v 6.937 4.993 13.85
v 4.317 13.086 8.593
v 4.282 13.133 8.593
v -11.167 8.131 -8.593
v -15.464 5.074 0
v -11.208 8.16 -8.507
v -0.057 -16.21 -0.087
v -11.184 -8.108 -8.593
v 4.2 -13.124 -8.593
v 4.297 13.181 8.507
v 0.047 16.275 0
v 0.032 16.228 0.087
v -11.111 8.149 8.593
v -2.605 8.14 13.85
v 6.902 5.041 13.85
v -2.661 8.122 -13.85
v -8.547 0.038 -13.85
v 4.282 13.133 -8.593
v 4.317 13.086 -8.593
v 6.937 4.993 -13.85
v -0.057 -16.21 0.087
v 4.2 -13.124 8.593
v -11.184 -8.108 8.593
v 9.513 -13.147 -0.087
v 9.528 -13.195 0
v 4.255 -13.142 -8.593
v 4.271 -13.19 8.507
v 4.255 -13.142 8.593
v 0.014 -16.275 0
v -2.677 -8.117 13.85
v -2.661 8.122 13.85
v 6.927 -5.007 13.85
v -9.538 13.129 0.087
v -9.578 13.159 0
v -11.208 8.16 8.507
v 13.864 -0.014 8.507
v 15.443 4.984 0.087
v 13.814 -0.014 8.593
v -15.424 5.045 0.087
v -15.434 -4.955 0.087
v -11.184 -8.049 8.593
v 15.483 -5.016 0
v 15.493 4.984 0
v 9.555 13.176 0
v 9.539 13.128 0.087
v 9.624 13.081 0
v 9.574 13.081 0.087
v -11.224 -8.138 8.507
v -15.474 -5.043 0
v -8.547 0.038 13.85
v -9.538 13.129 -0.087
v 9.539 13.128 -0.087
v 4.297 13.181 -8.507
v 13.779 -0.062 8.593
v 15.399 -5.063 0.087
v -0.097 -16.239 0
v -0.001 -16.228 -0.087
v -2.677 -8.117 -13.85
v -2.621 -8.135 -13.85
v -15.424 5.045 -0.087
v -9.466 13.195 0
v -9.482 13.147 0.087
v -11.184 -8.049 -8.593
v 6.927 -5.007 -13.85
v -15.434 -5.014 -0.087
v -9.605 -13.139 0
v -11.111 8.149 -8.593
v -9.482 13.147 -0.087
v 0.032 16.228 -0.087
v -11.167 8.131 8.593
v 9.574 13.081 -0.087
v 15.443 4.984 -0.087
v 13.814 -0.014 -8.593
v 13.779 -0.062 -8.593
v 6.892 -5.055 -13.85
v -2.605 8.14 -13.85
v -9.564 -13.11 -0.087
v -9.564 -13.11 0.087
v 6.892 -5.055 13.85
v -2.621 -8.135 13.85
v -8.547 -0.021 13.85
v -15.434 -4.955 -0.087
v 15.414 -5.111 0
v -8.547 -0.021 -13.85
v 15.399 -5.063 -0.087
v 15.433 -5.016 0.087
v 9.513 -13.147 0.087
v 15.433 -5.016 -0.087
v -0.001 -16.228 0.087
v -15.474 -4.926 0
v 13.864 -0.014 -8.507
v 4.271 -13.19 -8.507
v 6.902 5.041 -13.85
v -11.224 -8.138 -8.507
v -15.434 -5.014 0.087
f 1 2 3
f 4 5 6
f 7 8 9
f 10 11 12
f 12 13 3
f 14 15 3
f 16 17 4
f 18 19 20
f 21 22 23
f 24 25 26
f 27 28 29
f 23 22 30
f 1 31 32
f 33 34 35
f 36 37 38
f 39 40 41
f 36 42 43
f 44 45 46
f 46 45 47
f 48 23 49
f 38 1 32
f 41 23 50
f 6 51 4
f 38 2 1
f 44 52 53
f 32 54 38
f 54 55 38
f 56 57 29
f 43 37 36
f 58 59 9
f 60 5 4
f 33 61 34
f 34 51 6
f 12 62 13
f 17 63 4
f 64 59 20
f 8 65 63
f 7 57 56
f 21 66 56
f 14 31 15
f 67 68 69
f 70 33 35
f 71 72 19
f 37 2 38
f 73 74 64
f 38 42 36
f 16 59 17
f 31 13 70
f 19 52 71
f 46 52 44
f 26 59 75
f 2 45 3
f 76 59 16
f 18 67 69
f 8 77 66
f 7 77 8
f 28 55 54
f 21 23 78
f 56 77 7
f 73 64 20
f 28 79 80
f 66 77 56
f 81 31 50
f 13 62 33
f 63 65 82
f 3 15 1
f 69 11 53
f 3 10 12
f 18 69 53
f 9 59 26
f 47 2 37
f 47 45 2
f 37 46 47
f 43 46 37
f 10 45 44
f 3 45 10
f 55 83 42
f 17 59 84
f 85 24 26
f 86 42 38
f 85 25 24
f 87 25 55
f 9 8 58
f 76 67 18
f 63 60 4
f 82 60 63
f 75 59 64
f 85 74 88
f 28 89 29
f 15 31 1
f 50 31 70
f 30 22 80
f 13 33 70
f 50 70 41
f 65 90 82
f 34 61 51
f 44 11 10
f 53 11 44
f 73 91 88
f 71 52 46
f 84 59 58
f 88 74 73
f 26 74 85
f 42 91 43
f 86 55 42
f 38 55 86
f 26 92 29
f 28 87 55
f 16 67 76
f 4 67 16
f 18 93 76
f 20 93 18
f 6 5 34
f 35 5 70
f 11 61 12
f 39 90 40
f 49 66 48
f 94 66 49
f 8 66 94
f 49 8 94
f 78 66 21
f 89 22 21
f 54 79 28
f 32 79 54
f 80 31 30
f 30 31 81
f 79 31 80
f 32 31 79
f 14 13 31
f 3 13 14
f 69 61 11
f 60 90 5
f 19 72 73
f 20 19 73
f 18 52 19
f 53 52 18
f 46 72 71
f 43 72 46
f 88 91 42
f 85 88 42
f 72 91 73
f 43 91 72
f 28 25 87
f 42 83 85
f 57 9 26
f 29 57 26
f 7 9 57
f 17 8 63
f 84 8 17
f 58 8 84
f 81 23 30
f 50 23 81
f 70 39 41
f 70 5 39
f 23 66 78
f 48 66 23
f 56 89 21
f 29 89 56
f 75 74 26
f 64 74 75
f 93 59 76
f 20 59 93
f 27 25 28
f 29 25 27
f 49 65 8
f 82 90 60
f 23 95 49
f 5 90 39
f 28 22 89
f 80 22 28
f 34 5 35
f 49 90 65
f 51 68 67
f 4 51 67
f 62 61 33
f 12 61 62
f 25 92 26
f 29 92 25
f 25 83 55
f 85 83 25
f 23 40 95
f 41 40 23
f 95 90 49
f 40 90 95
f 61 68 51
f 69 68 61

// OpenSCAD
// Auto-generated OpenSCAD file

    inner_points = 10*[[-0.0016418331039271756, -1.6180331557585443, -9.663416068995967e-15], [0.0016418331039271756, 1.6180331557585443, 9.663416068995967e-15], [-0.9523842975581269, -1.3080512751855748, 1.785566891566374e-13], [0.949727755792118, -1.3099813657560027, -1.9419242480370474e-13], [-0.949727755792118, 1.3099813657560027, 1.9419242480370474e-13], [0.9523842975581269, 1.3080512751855748, -1.785566891566374e-13], [-1.5393483306968156, -0.49843826651935746, 2.9857420804308504e-13], [1.5383336220347341, -0.5015612186636755, -3.045465276211565e-13], [-1.5383336220347341, 0.5015612186636755, 3.045465276211565e-13], [1.5393483306968156, 0.49843826651935746, -2.9857420804308504e-13], [-0.2636863372841518, -0.8087498459225672, -1.376381920471127], [-0.26368633728361235, -0.808749845922584, 1.3763819204712202], [-0.2620445041802246, 0.8092833098359772, -1.3763819204711172], [-0.26204450417968517, 0.8092833098359603, 1.37638192047123], [0.6876832516118934, -0.5006980559200255, -1.3763819204713112], [0.6876832516124327, -0.5006980559200425, 1.376381920471036], [0.6886979602739751, 0.49930142926300763, -1.3763819204713055], [0.6886979602745145, 0.49930142926299065, 1.3763819204710417], [-0.8506503704228404, 0.0008631627436501369, -1.3763819204710068], [-0.8506503704223011, 0.0008631627436331492, 1.3763819204713403], [0.4239969143281142, -1.3094479018426044, -0.850650808352131], [0.4239969143284476, -1.3094479018426148, 0.8506508083519487], [0.42665345609412314, 1.308584739098973, -0.8506508083521155], [0.42665345609445654, 1.3085847390989627, 0.8506508083519643], [-1.1143367077066197, -0.8078866831789286, -0.8506508083518266], [-1.1143367077062865, -0.8078866831789392, 0.8506508083522532], [-1.1126948746026926, 0.8101464725796157, -0.8506508083518168], [-1.1126948746023593, 0.8101464725796051, 0.8506508083522629], [1.376381211886241, -0.0013966266570295412, -0.8506508083523096], [1.3763812118865746, -0.0013966266570400404, 0.8506508083517702]];

    outer_points = 10*[[1.6180220198478508, 0.0, -0.006223506839090811], [-1.6180220198478508, 0.0, 0.006223506839090811], [1.3053494309833273, -0.010073202420207877, -0.9560310572227243], [1.3126651916762522, 0.010073202420207877, 0.9459612116278578], [-1.3126651916762522, -0.010073202420207877, -0.9459612116278578], [-1.3053494309833273, 0.010073202420207877, 0.9560310572227243], [0.4940777266785081, -0.016298783891454047, -1.5406672380477728], [0.5059148761332206, 0.016298783891454047, 1.5368208992919972], [-0.5059148761332206, -0.016298783891454047, -1.5368208992919972], [-0.4940777266785081, 0.016298783891454047, 1.5406672380477728], [0.8079439244447668, 1.3735205511194541, -0.28053858799672193], [0.8080560688782716, -1.3790888804671222, -0.2513826526847642], [-0.810078095403084, 1.3735205511194541, -0.27431508115763115], [-0.8099659509695791, -1.3790888804671222, -0.2451591458456734], [0.5025870962731682, 1.383593753539662, 0.6716461304702268], [0.5026992407066729, -1.3690156780469143, 0.7008020657821845], [-0.4974055065385606, 1.383593753539662, 0.6754924692260023], [-0.4972933621050558, -1.3690156780469143, 0.70464840453796], [-0.003327779860052472, 1.3672949696482082, -0.8651747688217704], [-0.0032156354265477157, -1.3853144619383682, -0.8360188335098125], [1.3106085106156622, 0.8551079663095562, 0.41125379828717096], [1.3106778196872173, -0.8460982201644762, 0.42927315728375415], [-1.3074061120439173, 0.8551079663095562, 0.4213236438820373], [-1.3073368029723622, -0.8460982201644762, 0.4393430028786205], [0.8046936344824416, 0.8388091824181022, -1.1255671010048263], [0.8047629435539967, -0.8623970040559302, -1.1075477420082434], [-0.8133283853654092, 0.8388091824181022, -1.1193435941657353], [-0.8132590762938541, -0.8623970040559302, -1.1013242351691523], [0.005259079632334848, 0.8651811687297641, 1.3672848555098953], [0.00532838870388989, -0.8360250177442683, 1.3853042145064782]];

    // Convex hull for inner set (I)
    module inner_hull() {
        hull() {
            for (p = inner_points) {
                translate(p) sphere(r=0.1);
            }
        }
    }

    // Convex hull for outer set (O) minus inner hull (O \ I)
    module outer_minus_inner() {
        difference() {
            hull() {
                for (p = outer_points) {
                    translate(p) sphere(r=0.1);
                }
            }
            inner_hull(); // Subtract inner hull
        }
    }

    // Convex hull for outer set (O) minus all translated inner hulls
    module outer_minus_AllTranslationInner() {
        difference() {
            hull() {
                for (p = outer_points) {
                    translate(p) sphere(r=0.1);
                }
            }
            hull() {
                translate([0,0,50]) inner_hull();
                translate([0,0,-50]) inner_hull();
            }; // Subtract translated inner hulls
        }
    }

    // Difference between outer_minus_inner and outer_minus_AllTranslationInner
    module outer_minus_inner_diff() {
        difference() {
            // Outer minus inner
            difference() {
                hull() {
                    for (p = outer_points) {
                        translate(p) sphere(r=0.1);
                    }
                }
                inner_hull();
            }

            // Subtract Outer minus AllTranslationInner
            difference() {
                hull() {
                    for (p = outer_points) {
                        translate(p) sphere(r=0.1);
                    }
                }
                hull() {
                    translate([0,0,50]) inner_hull();
                    translate([0,0,-50]) inner_hull();
                };
            }
        }
    }

    // Rendering all with colors applied
    color([1, 0, 0, 0.5]) inner_hull(); // Transparent red
    
